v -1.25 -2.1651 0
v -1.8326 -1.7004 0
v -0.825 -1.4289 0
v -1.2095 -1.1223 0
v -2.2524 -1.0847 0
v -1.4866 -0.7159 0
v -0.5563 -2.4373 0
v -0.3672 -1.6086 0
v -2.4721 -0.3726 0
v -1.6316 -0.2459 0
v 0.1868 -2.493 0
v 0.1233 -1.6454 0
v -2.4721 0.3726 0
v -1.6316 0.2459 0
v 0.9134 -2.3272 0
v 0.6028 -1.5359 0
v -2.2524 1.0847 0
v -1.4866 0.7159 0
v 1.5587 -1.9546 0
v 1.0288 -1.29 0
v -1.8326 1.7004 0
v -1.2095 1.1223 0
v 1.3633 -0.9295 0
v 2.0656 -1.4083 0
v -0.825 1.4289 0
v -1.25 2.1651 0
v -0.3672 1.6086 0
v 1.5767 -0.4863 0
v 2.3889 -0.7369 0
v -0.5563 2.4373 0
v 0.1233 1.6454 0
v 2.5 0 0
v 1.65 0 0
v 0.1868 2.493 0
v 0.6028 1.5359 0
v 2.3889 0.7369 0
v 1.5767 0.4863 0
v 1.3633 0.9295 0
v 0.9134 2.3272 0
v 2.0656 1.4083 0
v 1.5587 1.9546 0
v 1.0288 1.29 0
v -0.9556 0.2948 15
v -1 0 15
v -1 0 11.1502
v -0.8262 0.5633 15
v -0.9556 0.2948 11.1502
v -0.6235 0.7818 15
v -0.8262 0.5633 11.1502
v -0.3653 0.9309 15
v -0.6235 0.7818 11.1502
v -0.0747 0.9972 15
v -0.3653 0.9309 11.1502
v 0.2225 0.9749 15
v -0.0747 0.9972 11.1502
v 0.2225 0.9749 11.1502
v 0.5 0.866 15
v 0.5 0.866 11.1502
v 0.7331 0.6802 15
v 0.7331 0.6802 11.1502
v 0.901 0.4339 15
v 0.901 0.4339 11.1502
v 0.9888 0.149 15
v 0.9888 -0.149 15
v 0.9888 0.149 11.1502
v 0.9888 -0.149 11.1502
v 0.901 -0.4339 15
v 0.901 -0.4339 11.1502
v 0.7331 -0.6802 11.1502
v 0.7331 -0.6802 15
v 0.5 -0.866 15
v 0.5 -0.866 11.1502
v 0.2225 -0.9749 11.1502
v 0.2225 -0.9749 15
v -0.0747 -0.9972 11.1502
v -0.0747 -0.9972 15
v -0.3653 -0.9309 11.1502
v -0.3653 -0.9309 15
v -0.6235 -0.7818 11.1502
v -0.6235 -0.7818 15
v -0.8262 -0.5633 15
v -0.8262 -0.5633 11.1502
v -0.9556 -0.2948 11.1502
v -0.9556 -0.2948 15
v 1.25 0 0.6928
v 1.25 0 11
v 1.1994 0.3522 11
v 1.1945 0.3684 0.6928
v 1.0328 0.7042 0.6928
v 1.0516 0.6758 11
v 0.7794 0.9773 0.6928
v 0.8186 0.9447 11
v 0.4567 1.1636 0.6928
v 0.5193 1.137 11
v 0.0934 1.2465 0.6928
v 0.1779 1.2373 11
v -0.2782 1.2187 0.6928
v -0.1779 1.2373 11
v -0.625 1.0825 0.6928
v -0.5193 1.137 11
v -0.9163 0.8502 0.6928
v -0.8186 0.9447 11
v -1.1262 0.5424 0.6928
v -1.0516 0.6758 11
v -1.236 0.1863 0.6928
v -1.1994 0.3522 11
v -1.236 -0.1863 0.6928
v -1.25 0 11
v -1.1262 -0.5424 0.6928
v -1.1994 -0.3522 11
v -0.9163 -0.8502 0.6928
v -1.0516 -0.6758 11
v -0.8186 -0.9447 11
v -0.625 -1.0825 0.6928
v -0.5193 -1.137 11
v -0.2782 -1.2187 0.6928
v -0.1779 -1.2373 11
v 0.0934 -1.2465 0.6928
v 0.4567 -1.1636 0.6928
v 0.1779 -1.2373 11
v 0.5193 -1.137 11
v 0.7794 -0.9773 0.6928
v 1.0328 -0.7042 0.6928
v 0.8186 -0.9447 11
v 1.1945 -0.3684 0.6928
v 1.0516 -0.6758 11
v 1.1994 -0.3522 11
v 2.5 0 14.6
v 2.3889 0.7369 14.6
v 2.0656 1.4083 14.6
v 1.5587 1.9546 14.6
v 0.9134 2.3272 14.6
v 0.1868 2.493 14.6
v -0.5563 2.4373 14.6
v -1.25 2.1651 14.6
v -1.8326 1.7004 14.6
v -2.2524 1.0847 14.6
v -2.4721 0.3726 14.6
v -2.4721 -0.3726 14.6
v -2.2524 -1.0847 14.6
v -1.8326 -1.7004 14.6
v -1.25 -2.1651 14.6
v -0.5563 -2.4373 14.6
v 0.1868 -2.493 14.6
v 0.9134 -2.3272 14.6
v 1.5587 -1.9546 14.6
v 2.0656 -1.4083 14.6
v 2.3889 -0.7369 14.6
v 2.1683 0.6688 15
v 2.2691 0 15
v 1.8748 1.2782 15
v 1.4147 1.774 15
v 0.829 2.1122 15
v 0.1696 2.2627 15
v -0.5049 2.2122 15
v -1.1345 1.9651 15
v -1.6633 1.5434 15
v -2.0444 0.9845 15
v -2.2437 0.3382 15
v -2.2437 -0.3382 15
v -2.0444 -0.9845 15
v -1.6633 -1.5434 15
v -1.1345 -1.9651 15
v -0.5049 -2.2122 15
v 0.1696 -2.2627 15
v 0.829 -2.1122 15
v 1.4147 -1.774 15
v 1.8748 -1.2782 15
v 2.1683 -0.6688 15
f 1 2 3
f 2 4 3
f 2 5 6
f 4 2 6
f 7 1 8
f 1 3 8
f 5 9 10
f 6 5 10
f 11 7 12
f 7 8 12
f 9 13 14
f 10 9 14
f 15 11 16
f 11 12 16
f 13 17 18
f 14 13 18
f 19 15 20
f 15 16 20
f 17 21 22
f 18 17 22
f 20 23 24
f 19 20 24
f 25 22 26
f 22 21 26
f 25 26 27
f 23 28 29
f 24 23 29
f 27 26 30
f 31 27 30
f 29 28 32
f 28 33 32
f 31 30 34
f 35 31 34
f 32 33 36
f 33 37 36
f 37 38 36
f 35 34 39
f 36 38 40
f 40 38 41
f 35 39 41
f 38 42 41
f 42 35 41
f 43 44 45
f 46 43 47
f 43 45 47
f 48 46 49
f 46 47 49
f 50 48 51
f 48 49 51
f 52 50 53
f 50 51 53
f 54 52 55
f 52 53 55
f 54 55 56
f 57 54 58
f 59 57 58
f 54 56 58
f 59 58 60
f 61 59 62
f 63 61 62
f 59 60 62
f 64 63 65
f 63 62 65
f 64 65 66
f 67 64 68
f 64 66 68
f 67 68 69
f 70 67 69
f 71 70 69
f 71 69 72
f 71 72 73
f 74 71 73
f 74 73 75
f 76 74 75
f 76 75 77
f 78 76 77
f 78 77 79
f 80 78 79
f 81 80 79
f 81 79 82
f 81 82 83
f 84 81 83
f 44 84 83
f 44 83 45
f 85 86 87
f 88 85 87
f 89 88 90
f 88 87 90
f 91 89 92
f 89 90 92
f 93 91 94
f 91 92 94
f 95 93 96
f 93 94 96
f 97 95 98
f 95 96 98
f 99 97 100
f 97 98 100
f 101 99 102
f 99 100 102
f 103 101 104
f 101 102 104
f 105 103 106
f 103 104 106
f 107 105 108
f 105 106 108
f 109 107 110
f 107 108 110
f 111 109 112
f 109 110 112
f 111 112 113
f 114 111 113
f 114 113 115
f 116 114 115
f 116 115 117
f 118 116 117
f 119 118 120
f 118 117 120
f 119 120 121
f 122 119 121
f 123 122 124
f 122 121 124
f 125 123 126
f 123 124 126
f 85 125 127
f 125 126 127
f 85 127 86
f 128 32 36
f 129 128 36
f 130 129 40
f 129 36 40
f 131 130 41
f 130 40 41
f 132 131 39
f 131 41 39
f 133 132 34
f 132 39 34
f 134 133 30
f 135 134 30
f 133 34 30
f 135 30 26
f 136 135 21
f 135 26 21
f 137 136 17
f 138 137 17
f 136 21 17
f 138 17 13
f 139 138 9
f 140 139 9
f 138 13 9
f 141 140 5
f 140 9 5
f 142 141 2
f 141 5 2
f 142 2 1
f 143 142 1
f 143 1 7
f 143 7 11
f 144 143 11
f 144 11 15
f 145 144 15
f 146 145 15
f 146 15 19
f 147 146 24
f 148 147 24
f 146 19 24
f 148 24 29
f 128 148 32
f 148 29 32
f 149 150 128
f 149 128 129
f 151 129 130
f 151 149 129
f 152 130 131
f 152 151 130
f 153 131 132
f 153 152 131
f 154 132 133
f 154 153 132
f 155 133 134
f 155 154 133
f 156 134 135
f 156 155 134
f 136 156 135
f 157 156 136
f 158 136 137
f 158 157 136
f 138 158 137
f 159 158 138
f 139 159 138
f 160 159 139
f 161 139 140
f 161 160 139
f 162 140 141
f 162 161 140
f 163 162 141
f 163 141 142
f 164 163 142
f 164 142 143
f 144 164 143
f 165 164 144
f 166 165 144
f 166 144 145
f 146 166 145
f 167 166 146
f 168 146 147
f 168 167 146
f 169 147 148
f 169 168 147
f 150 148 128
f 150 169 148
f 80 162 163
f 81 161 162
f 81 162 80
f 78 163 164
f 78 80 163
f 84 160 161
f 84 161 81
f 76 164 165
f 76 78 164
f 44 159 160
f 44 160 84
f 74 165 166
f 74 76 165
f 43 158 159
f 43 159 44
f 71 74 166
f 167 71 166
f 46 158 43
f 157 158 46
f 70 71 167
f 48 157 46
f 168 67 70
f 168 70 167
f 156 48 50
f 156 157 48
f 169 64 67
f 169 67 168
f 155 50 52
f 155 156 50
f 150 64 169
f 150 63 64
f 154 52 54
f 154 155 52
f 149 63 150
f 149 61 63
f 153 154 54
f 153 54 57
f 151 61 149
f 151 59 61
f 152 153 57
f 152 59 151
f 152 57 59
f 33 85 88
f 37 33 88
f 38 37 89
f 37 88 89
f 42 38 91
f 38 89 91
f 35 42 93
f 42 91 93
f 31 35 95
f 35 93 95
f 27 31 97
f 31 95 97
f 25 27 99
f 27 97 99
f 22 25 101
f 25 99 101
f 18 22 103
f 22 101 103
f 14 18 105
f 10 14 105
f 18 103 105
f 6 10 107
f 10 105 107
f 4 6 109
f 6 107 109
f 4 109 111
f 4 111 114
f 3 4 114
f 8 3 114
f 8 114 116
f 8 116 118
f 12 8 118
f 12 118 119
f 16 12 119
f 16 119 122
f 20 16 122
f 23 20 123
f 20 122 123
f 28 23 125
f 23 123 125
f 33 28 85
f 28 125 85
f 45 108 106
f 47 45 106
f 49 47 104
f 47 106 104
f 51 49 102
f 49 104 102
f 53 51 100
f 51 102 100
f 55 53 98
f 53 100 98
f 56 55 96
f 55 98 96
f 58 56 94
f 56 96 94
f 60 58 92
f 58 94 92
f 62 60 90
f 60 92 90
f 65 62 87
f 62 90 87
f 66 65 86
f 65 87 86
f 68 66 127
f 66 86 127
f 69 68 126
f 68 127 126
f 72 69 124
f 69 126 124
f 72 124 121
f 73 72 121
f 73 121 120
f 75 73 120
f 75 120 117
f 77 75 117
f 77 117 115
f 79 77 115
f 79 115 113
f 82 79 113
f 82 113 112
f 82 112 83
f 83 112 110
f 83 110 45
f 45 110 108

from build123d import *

# Parameters (mm, degrees)
SKETCH1_R                       = 2.5
BOSS_EXTRUDE1_DEPTH             = 15
SKETCH2_R                       = 1
CUT_EXTRUDE1_DEPTH              = 16
TAP_DRILL_FOR_M3X0_5_TAP1_D     = 2.5
TAP_DRILL_FOR_M3X0_5_TAP1_DEPTH = 11
TAP_DRILL_FOR_M3X0_5_TAP1_TIP   = 0.751075774
CHAMFER1_SIZE                   = 0.4
CHAMFER1_SIZE2                  = 0.230940108
CHAMFER2_SIZE                   = 0.4
CHAMFER2_SIZE2                  = 0.692820323


with BuildPart() as part:
    # Sketch1 → Boss-Extrude1 (new body)
    with BuildSketch(Plane.XY):
        Circle(SKETCH1_R)
    extrude(amount=BOSS_EXTRUDE1_DEPTH)

    # Sketch2 → Cut-Extrude1 (cut, through all)
    with BuildSketch(Plane(origin=(0, 0, 0), x_dir=(-1, 0, 0), z_dir=(0, 0, -1))):
        Circle(SKETCH2_R)
    extrude(amount=-CUT_EXTRUDE1_DEPTH, mode=Mode.SUBTRACT)

    # Tap Drill for M3x0.5 Tap1
    with Locations(Plane(origin=(0, 0, 0), x_dir=(-1, 0, 0), z_dir=(0, 0, -1))):
        with Locations((0, 0)):
            Hole(TAP_DRILL_FOR_M3X0_5_TAP1_D / 2, depth=TAP_DRILL_FOR_M3X0_5_TAP1_DEPTH)
            with Locations((0, 0, -(TAP_DRILL_FOR_M3X0_5_TAP1_DEPTH + TAP_DRILL_FOR_M3X0_5_TAP1_TIP / 2))):  # 118° drill point
                Cone(0, TAP_DRILL_FOR_M3X0_5_TAP1_D / 2, TAP_DRILL_FOR_M3X0_5_TAP1_TIP, mode=Mode.SUBTRACT)

    # Chamfer1
    chamfer1_edges = [part.edges().sort_by_distance(p)[0] for p in [
        (-2.5, 0, 15),
    ]]
    chamfer1_side = [part.faces().sort_by_distance(p)[0] for p in [
        (-2.5, 0, 7.5),
    ]]
    chamfer(chamfer1_edges, length=CHAMFER1_SIZE, length2=CHAMFER1_SIZE2, reference=chamfer1_side[0])

    # Chamfer2
    chamfer2_edges = [part.edges().sort_by_distance(p)[0] for p in [
        (-1.25, 0, 0),
    ]]
    chamfer2_side = [part.faces().sort_by_distance(p)[0] for p in [
        (-2.429289322, 0, 0),
    ]]
    chamfer(chamfer2_edges, length=CHAMFER2_SIZE, length2=CHAMFER2_SIZE2, reference=chamfer2_side[0])


solid = part.part
